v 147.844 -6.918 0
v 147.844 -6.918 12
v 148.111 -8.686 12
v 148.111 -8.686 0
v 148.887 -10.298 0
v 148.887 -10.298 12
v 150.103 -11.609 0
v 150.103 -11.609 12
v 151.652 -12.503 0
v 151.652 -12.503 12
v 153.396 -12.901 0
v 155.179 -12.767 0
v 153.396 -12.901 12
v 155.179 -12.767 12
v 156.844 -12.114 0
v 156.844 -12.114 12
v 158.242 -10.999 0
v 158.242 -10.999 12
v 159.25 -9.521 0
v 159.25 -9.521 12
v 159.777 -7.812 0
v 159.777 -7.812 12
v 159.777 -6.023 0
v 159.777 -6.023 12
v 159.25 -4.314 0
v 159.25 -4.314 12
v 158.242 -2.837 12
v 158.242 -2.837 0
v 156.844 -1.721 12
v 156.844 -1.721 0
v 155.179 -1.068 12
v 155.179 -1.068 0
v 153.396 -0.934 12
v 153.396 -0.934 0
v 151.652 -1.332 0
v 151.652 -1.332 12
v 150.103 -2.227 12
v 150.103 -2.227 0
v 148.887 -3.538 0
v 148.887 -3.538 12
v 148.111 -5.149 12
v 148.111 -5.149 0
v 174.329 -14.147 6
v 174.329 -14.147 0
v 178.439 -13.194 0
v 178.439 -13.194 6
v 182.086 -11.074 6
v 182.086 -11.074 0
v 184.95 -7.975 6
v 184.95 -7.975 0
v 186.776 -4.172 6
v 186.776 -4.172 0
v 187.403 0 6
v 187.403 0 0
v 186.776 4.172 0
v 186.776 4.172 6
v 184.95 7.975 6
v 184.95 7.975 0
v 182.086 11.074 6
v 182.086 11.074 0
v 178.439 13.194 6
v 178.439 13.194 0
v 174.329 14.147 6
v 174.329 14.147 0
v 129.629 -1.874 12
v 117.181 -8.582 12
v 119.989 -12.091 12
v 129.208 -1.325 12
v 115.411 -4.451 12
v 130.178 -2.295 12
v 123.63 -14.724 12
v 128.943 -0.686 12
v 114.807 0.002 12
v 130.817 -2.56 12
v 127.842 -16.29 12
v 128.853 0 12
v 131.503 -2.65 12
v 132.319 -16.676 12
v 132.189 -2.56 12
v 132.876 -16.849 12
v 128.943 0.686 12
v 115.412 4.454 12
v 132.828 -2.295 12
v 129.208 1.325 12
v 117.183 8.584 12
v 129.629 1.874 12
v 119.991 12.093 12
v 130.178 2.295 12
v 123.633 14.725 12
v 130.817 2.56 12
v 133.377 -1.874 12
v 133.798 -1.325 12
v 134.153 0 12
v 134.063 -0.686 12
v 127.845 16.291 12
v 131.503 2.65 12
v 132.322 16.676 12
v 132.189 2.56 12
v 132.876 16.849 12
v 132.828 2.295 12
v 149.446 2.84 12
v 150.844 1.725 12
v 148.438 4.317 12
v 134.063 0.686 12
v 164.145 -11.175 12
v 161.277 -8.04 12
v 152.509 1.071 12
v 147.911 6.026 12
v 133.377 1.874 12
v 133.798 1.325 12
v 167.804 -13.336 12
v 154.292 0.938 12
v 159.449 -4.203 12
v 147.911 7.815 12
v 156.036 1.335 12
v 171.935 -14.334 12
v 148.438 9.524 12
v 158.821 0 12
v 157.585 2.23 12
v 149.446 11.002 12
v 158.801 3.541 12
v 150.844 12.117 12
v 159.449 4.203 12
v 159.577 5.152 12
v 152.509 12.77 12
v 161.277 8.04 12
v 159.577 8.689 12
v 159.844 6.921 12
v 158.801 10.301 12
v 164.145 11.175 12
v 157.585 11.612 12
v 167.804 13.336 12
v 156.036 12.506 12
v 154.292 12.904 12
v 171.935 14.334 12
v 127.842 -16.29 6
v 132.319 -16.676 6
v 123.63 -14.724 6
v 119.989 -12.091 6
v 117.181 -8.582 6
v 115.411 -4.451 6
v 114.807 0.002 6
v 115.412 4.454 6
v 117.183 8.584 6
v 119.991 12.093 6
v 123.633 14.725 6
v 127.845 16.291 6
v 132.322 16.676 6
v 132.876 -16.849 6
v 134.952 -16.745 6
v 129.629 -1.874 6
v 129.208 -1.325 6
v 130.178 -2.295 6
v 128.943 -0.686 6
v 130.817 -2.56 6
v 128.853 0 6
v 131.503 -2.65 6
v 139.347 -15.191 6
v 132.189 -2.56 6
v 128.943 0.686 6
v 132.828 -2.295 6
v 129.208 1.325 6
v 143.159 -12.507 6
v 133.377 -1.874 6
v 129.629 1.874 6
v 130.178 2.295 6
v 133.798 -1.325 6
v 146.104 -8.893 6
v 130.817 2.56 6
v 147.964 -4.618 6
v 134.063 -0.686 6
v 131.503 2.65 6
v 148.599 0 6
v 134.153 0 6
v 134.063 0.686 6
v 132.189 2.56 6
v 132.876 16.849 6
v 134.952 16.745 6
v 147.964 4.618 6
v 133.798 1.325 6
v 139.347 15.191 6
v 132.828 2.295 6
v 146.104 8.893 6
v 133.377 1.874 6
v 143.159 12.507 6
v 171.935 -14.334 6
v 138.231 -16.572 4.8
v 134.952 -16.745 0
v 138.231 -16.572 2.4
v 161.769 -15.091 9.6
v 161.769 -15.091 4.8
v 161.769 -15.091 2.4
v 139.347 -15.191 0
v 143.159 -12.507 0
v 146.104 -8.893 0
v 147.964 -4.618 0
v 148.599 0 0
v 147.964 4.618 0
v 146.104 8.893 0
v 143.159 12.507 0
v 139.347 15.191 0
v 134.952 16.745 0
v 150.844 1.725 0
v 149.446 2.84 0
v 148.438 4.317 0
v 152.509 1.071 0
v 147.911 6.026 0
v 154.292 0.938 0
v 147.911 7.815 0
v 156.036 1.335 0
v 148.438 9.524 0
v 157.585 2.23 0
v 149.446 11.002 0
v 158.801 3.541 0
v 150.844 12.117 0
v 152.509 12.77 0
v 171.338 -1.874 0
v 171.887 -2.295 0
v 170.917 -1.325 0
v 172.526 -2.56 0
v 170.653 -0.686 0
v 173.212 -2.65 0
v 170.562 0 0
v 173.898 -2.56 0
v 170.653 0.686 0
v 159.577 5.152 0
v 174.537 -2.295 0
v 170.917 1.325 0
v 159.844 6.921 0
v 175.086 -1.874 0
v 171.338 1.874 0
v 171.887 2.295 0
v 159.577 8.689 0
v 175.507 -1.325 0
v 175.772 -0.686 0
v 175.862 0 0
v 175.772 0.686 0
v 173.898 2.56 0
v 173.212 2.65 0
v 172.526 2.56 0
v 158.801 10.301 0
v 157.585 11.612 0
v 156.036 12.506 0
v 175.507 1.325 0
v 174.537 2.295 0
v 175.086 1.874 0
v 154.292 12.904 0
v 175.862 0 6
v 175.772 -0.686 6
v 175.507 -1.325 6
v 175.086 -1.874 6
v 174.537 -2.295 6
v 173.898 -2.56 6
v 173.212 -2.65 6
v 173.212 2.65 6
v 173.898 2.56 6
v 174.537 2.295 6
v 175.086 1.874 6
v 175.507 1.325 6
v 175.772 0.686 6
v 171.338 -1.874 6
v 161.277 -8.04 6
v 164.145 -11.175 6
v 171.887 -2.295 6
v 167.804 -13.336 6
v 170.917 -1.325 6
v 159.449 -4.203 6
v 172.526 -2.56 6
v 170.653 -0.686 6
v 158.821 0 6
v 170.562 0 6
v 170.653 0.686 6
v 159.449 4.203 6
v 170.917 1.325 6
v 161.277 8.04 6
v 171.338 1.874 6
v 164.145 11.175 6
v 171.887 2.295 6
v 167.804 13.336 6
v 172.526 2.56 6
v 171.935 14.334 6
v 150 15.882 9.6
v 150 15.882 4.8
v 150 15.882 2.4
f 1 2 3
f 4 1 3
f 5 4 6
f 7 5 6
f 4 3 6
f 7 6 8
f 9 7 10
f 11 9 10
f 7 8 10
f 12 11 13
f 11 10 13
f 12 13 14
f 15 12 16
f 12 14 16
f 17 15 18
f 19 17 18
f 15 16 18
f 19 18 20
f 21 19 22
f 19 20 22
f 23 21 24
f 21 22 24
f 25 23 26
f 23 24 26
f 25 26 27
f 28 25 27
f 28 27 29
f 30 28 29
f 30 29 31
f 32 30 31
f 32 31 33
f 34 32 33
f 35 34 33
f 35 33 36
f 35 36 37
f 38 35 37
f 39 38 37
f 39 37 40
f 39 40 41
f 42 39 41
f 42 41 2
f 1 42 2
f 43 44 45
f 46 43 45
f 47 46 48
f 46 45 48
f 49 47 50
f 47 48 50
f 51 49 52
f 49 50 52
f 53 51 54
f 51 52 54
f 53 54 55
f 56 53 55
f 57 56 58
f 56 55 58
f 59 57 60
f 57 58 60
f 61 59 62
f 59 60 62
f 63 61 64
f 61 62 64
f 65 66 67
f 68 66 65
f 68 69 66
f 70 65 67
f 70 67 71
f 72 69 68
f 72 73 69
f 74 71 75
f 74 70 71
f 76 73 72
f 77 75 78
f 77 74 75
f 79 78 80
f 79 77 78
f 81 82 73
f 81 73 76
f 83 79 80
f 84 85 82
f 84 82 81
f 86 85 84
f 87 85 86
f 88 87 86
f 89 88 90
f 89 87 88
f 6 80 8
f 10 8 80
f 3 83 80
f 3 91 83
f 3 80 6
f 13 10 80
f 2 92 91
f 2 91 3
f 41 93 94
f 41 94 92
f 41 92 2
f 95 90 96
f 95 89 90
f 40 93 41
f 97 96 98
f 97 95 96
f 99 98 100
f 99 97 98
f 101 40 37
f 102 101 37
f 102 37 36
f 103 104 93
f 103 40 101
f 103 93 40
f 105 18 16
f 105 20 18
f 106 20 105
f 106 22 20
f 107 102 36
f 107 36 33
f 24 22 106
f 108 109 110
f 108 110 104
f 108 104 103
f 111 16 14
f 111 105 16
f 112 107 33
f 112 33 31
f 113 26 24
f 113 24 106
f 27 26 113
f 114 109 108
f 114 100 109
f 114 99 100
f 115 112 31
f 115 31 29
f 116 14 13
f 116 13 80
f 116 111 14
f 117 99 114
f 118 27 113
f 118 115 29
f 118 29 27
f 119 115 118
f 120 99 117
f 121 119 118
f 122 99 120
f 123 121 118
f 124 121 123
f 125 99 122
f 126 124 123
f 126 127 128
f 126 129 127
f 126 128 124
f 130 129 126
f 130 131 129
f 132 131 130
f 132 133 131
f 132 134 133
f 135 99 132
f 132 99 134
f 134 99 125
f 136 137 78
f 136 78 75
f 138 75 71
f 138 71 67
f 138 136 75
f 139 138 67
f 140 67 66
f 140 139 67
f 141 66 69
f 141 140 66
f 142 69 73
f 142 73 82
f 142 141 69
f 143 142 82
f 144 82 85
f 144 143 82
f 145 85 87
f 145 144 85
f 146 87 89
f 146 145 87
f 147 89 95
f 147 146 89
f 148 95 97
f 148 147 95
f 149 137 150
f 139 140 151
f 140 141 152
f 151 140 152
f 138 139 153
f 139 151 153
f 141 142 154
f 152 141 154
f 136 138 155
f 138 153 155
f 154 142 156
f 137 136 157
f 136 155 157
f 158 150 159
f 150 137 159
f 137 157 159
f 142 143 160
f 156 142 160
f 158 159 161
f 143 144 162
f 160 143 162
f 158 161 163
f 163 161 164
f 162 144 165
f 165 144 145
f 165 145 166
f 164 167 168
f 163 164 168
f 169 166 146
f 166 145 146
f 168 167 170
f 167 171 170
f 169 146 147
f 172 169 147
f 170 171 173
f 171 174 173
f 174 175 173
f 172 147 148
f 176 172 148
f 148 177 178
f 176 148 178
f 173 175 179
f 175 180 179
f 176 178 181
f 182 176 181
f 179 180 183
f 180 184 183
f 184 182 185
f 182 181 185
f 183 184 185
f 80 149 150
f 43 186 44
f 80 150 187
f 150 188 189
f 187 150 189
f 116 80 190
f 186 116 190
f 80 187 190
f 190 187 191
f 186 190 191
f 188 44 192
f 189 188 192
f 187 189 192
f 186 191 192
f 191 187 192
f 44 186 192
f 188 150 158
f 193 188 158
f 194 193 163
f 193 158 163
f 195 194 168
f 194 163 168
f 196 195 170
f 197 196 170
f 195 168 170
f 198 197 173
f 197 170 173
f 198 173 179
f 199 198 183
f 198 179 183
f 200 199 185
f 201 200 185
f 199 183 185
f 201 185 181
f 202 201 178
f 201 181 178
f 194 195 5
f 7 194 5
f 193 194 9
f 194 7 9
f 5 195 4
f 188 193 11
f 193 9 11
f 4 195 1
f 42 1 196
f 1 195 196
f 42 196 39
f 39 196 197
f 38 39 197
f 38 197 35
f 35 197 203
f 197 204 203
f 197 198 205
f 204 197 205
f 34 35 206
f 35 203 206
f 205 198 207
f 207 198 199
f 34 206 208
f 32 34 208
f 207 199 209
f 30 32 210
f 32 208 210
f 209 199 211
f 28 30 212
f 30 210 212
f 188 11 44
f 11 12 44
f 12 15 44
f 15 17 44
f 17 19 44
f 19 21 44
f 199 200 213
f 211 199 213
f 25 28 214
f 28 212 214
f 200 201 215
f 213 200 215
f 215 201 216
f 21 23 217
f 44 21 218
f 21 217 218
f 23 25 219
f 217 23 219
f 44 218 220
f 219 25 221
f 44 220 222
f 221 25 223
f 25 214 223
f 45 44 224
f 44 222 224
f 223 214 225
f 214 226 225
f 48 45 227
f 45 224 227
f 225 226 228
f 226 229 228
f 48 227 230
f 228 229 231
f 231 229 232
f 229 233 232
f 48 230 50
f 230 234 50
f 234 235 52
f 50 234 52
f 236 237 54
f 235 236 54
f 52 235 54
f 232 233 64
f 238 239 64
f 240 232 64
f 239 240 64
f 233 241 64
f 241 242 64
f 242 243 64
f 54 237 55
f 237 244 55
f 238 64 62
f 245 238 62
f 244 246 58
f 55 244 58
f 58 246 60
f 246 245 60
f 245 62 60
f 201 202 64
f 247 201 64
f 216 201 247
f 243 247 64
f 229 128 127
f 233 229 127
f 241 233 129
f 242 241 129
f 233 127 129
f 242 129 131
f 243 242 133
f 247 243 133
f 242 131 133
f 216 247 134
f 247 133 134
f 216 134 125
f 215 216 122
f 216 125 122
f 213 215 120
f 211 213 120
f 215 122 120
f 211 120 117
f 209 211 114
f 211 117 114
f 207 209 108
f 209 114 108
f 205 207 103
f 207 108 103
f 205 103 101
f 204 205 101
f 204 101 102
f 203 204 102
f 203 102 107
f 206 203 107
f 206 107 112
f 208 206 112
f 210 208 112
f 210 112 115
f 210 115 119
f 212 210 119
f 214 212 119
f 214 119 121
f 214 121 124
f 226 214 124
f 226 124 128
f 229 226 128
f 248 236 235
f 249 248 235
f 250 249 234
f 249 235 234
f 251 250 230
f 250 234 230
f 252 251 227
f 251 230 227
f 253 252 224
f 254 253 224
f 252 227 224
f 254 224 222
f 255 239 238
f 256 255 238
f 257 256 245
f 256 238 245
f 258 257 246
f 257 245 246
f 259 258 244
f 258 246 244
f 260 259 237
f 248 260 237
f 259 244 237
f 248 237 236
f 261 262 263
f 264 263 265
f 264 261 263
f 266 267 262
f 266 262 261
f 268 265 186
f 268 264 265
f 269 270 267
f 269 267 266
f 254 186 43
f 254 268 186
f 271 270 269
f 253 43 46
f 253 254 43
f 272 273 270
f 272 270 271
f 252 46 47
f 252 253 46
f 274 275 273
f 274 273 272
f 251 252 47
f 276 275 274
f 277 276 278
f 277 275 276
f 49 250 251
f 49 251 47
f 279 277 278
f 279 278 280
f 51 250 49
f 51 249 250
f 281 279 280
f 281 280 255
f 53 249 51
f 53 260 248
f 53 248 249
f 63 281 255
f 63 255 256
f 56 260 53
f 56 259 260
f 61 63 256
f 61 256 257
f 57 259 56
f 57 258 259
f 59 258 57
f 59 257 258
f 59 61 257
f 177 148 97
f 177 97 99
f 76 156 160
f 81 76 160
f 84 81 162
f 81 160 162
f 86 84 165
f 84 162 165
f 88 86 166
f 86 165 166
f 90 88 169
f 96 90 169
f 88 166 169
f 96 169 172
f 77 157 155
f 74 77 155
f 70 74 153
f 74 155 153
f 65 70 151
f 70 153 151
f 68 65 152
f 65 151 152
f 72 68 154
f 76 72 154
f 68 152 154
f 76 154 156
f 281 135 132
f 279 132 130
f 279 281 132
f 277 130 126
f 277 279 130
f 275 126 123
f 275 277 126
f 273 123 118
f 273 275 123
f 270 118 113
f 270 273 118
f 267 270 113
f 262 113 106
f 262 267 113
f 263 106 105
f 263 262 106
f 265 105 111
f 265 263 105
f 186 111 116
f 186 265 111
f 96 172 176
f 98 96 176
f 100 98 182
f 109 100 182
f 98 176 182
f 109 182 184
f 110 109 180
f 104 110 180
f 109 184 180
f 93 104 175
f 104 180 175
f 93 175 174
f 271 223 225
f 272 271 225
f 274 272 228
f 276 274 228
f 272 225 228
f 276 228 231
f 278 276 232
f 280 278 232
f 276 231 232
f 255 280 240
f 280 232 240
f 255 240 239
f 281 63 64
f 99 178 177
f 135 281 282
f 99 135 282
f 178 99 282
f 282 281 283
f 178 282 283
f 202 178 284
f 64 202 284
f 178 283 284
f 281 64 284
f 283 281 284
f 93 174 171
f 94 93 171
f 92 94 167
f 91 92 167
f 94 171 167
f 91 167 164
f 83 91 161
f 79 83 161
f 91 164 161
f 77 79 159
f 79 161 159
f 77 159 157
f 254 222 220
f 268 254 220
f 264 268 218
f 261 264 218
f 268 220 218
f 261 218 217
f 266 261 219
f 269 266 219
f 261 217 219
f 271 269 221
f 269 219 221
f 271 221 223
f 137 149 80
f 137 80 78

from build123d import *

# Parameters (mm, degrees)
BOSS_EXTRUDE2_DEPTH = 12
SKETCH2_R           = 14.190949605
SKETCH2_R_2         = 2.65
BOSS_EXTRUDE3_DEPTH = 6
BOSS_EXTRUDE4_START = 6
SKETCH2_24_R        = 16.896313039
SKETCH2_24_R_2      = 2.65
BOSS_EXTRUDE4_DEPTH = 6
CUT_EXTRUDE3_DEPTH  = 189.258998684
CUT_EXTRUDE5_DEPTH  = 189.258998684
CUT_EXTRUDE6_START  = -10
CUT_EXTRUDE6_DEPTH  = 10
SKETCH7_R           = 6
CUT_EXTRUDE7_DEPTH  = 189.54140377


with BuildPart() as part:
    # Sketch2<21> → Boss-Extrude2 (new body)
    with BuildSketch(Plane.XY):
        with BuildLine():
            add(Edge.make_bspline(
                [(174.328689217, 14.146966087), (174.040831823, 14.169682671), (169.855389857, 14.498930953), (161.747864996, 15.106955372), (150.003172521, 15.898554075), (140.188386584, 16.476242113), (134.2963802, 16.779872269), (132.328689217, 16.8761315)],
                knots=[0.206706183, 0.206706183, 0.206706183, 0.206706183, 0.208122338, 0.227296649, 0.24658007, 0.265853108, 0.275514954, 0.275514954, 0.275514954, 0.275514954], degree=3))
            ThreePointArc((132.328689217, 16.8761315), (148.39942372, 0), (132.328689217, -16.8761315))
            add(Edge.make_bspline(
                [(132.328689217, -16.8761315), (134.2963802, -16.779872269), (140.188386584, -16.476242113), (150.003172521, -15.898554075), (161.747864996, -15.106955372), (169.855389857, -14.498930953), (174.040831823, -14.169682671), (174.328689217, -14.146966087)],
                knots=[0.724485046, 0.724485046, 0.724485046, 0.724485046, 0.734146892, 0.75341993, 0.772703351, 0.791877662, 0.793293817, 0.793293817, 0.793293817, 0.793293817], degree=3))
            ThreePointArc((174.328689217, -14.146966087), (159.021316208, 0), (174.328689217, 14.146966087))
        make_face()
    extrude(amount=BOSS_EXTRUDE2_DEPTH)

    # Sketch2 → Boss-Extrude3 (add)
    with BuildSketch(Plane.XY):
        with Locations((173.212265813, 0)):
            Circle(SKETCH2_R)
        with Locations((173.212265813, 0)):
            Circle(SKETCH2_R_2, mode=Mode.SUBTRACT)
    extrude(amount=BOSS_EXTRUDE3_DEPTH)

    # Sketch2<24> → Boss-Extrude4 (add)
    with BuildSketch(Plane.XY.offset(BOSS_EXTRUDE4_START)):
        with Locations((131.503110681, 0)):
            Circle(SKETCH2_24_R)
        with Locations((131.503110681, 0)):
            Circle(SKETCH2_24_R_2, mode=Mode.SUBTRACT)
    extrude(amount=BOSS_EXTRUDE4_DEPTH)

    # Sketch4 → Cut-Extrude3 (cut, through all)
    with BuildSketch(Plane.XY.offset(6)):
        with BuildLine():
            add(Edge.make_bspline(
                [(174.328689217, 14.146966087), (173.530907872, 14.209923879), (172.733082923, 14.272330644), (171.935214304, 14.334174897)],
                knots=[0.206706183, 0.206706183, 0.206706183, 0.206706183, 0.210630981, 0.210630981, 0.210630981, 0.210630981], degree=3))
            ThreePointArc((171.935214304, 14.334174897), (158.821316208, -4e-08), (171.935214382, -14.334174904))
            add(Edge.make_bspline(
                [(171.935214382, -14.334174904), (172.733082975, -14.272330648), (173.530907898, -14.209923882), (174.328689217, -14.146966087)],
                knots=[0.789369019, 0.789369019, 0.789369019, 0.789369019, 0.793293817, 0.793293817, 0.793293817, 0.793293817], degree=3))
            ThreePointArc((174.328689217, -14.146966087), (159.021316208, 0), (174.328689217, 14.146966087))
        make_face()
    extrude(amount=CUT_EXTRUDE3_DEPTH, mode=Mode.SUBTRACT)

    # Sketch5 → Cut-Extrude5 (cut, through all)
    with BuildSketch(Plane(origin=(0, 0, 6), x_dir=(-1, 0, 0), z_dir=(0, 0, -1))):
        with BuildLine():
            ThreePointArc((-132.328689217, -16.8761315), (-148.39942372, 0), (-132.328689217, 16.8761315))
            add(Edge.make_bspline(
                [(-134.952258251, 16.74476935), (-134.077785352, 16.789550444), (-133.203262036, 16.833347492), (-132.328689217, 16.8761315)],
                knots=[0.271220587, 0.271220587, 0.271220587, 0.271220587, 0.275514954, 0.275514954, 0.275514954, 0.275514954], degree=3))
            ThreePointArc((-134.952258251, 16.74476935), (-148.59942372, 0), (-134.952258251, -16.74476935))
            add(Edge.make_bspline(
                [(-132.328689217, -16.8761315), (-133.203262036, -16.833347492), (-134.077785352, -16.789550444), (-134.952258251, -16.74476935)],
                knots=[0.724485046, 0.724485046, 0.724485046, 0.724485046, 0.728779413, 0.728779413, 0.728779413, 0.728779413], degree=3))
        make_face()
    extrude(amount=CUT_EXTRUDE5_DEPTH, mode=Mode.SUBTRACT)

    # Sketch6 → Cut-Extrude6 (cut)
    with BuildSketch(Plane.XY.offset(12).offset(CUT_EXTRUDE6_START)):
        with BuildLine():
            ThreePointArc((132.318916925, -16.676370387), (114.806797716, 0.001573603), (132.322060358, 16.676216313))
            Line((132.322060358, 16.676216313), (132.876380652, 16.849206008))
            add(Edge.make_bspline(
                [(132.876380652, 16.849206008), (132.693819003, 16.85822514), (132.511255189, 16.867200392), (132.328689217, 16.8761315)],
                knots=[0.27461851, 0.27461851, 0.27461851, 0.27461851, 0.275514954, 0.275514954, 0.275514954, 0.275514954], degree=3))
            ThreePointArc((132.328689217, 16.8761315), (114.606797642, 0), (132.328689217, -16.8761315))
            add(Edge.make_bspline(
                [(132.328689217, -16.8761315), (132.511255189, -16.867200392), (132.693819003, -16.85822514), (132.876380652, -16.849206008)],
                knots=[0.724485046, 0.724485046, 0.724485046, 0.724485046, 0.72538149, 0.72538149, 0.72538149, 0.72538149], degree=3))
            Line((132.876380652, -16.849206008), (132.318916925, -16.676370387))
        make_face()
    extrude(amount=CUT_EXTRUDE6_DEPTH, mode=Mode.SUBTRACT)

    # Sketch7 → Cut-Extrude7 (cut, through all)
    with BuildSketch(Plane.XY.offset(12)):
        with Locations((153.843979232, 6.920740335)):
            Circle(SKETCH7_R)
        with Locations((153.843979232, -6.917593129)):
            Circle(SKETCH7_R)
    extrude(amount=-CUT_EXTRUDE7_DEPTH, mode=Mode.SUBTRACT)


solid = part.part
